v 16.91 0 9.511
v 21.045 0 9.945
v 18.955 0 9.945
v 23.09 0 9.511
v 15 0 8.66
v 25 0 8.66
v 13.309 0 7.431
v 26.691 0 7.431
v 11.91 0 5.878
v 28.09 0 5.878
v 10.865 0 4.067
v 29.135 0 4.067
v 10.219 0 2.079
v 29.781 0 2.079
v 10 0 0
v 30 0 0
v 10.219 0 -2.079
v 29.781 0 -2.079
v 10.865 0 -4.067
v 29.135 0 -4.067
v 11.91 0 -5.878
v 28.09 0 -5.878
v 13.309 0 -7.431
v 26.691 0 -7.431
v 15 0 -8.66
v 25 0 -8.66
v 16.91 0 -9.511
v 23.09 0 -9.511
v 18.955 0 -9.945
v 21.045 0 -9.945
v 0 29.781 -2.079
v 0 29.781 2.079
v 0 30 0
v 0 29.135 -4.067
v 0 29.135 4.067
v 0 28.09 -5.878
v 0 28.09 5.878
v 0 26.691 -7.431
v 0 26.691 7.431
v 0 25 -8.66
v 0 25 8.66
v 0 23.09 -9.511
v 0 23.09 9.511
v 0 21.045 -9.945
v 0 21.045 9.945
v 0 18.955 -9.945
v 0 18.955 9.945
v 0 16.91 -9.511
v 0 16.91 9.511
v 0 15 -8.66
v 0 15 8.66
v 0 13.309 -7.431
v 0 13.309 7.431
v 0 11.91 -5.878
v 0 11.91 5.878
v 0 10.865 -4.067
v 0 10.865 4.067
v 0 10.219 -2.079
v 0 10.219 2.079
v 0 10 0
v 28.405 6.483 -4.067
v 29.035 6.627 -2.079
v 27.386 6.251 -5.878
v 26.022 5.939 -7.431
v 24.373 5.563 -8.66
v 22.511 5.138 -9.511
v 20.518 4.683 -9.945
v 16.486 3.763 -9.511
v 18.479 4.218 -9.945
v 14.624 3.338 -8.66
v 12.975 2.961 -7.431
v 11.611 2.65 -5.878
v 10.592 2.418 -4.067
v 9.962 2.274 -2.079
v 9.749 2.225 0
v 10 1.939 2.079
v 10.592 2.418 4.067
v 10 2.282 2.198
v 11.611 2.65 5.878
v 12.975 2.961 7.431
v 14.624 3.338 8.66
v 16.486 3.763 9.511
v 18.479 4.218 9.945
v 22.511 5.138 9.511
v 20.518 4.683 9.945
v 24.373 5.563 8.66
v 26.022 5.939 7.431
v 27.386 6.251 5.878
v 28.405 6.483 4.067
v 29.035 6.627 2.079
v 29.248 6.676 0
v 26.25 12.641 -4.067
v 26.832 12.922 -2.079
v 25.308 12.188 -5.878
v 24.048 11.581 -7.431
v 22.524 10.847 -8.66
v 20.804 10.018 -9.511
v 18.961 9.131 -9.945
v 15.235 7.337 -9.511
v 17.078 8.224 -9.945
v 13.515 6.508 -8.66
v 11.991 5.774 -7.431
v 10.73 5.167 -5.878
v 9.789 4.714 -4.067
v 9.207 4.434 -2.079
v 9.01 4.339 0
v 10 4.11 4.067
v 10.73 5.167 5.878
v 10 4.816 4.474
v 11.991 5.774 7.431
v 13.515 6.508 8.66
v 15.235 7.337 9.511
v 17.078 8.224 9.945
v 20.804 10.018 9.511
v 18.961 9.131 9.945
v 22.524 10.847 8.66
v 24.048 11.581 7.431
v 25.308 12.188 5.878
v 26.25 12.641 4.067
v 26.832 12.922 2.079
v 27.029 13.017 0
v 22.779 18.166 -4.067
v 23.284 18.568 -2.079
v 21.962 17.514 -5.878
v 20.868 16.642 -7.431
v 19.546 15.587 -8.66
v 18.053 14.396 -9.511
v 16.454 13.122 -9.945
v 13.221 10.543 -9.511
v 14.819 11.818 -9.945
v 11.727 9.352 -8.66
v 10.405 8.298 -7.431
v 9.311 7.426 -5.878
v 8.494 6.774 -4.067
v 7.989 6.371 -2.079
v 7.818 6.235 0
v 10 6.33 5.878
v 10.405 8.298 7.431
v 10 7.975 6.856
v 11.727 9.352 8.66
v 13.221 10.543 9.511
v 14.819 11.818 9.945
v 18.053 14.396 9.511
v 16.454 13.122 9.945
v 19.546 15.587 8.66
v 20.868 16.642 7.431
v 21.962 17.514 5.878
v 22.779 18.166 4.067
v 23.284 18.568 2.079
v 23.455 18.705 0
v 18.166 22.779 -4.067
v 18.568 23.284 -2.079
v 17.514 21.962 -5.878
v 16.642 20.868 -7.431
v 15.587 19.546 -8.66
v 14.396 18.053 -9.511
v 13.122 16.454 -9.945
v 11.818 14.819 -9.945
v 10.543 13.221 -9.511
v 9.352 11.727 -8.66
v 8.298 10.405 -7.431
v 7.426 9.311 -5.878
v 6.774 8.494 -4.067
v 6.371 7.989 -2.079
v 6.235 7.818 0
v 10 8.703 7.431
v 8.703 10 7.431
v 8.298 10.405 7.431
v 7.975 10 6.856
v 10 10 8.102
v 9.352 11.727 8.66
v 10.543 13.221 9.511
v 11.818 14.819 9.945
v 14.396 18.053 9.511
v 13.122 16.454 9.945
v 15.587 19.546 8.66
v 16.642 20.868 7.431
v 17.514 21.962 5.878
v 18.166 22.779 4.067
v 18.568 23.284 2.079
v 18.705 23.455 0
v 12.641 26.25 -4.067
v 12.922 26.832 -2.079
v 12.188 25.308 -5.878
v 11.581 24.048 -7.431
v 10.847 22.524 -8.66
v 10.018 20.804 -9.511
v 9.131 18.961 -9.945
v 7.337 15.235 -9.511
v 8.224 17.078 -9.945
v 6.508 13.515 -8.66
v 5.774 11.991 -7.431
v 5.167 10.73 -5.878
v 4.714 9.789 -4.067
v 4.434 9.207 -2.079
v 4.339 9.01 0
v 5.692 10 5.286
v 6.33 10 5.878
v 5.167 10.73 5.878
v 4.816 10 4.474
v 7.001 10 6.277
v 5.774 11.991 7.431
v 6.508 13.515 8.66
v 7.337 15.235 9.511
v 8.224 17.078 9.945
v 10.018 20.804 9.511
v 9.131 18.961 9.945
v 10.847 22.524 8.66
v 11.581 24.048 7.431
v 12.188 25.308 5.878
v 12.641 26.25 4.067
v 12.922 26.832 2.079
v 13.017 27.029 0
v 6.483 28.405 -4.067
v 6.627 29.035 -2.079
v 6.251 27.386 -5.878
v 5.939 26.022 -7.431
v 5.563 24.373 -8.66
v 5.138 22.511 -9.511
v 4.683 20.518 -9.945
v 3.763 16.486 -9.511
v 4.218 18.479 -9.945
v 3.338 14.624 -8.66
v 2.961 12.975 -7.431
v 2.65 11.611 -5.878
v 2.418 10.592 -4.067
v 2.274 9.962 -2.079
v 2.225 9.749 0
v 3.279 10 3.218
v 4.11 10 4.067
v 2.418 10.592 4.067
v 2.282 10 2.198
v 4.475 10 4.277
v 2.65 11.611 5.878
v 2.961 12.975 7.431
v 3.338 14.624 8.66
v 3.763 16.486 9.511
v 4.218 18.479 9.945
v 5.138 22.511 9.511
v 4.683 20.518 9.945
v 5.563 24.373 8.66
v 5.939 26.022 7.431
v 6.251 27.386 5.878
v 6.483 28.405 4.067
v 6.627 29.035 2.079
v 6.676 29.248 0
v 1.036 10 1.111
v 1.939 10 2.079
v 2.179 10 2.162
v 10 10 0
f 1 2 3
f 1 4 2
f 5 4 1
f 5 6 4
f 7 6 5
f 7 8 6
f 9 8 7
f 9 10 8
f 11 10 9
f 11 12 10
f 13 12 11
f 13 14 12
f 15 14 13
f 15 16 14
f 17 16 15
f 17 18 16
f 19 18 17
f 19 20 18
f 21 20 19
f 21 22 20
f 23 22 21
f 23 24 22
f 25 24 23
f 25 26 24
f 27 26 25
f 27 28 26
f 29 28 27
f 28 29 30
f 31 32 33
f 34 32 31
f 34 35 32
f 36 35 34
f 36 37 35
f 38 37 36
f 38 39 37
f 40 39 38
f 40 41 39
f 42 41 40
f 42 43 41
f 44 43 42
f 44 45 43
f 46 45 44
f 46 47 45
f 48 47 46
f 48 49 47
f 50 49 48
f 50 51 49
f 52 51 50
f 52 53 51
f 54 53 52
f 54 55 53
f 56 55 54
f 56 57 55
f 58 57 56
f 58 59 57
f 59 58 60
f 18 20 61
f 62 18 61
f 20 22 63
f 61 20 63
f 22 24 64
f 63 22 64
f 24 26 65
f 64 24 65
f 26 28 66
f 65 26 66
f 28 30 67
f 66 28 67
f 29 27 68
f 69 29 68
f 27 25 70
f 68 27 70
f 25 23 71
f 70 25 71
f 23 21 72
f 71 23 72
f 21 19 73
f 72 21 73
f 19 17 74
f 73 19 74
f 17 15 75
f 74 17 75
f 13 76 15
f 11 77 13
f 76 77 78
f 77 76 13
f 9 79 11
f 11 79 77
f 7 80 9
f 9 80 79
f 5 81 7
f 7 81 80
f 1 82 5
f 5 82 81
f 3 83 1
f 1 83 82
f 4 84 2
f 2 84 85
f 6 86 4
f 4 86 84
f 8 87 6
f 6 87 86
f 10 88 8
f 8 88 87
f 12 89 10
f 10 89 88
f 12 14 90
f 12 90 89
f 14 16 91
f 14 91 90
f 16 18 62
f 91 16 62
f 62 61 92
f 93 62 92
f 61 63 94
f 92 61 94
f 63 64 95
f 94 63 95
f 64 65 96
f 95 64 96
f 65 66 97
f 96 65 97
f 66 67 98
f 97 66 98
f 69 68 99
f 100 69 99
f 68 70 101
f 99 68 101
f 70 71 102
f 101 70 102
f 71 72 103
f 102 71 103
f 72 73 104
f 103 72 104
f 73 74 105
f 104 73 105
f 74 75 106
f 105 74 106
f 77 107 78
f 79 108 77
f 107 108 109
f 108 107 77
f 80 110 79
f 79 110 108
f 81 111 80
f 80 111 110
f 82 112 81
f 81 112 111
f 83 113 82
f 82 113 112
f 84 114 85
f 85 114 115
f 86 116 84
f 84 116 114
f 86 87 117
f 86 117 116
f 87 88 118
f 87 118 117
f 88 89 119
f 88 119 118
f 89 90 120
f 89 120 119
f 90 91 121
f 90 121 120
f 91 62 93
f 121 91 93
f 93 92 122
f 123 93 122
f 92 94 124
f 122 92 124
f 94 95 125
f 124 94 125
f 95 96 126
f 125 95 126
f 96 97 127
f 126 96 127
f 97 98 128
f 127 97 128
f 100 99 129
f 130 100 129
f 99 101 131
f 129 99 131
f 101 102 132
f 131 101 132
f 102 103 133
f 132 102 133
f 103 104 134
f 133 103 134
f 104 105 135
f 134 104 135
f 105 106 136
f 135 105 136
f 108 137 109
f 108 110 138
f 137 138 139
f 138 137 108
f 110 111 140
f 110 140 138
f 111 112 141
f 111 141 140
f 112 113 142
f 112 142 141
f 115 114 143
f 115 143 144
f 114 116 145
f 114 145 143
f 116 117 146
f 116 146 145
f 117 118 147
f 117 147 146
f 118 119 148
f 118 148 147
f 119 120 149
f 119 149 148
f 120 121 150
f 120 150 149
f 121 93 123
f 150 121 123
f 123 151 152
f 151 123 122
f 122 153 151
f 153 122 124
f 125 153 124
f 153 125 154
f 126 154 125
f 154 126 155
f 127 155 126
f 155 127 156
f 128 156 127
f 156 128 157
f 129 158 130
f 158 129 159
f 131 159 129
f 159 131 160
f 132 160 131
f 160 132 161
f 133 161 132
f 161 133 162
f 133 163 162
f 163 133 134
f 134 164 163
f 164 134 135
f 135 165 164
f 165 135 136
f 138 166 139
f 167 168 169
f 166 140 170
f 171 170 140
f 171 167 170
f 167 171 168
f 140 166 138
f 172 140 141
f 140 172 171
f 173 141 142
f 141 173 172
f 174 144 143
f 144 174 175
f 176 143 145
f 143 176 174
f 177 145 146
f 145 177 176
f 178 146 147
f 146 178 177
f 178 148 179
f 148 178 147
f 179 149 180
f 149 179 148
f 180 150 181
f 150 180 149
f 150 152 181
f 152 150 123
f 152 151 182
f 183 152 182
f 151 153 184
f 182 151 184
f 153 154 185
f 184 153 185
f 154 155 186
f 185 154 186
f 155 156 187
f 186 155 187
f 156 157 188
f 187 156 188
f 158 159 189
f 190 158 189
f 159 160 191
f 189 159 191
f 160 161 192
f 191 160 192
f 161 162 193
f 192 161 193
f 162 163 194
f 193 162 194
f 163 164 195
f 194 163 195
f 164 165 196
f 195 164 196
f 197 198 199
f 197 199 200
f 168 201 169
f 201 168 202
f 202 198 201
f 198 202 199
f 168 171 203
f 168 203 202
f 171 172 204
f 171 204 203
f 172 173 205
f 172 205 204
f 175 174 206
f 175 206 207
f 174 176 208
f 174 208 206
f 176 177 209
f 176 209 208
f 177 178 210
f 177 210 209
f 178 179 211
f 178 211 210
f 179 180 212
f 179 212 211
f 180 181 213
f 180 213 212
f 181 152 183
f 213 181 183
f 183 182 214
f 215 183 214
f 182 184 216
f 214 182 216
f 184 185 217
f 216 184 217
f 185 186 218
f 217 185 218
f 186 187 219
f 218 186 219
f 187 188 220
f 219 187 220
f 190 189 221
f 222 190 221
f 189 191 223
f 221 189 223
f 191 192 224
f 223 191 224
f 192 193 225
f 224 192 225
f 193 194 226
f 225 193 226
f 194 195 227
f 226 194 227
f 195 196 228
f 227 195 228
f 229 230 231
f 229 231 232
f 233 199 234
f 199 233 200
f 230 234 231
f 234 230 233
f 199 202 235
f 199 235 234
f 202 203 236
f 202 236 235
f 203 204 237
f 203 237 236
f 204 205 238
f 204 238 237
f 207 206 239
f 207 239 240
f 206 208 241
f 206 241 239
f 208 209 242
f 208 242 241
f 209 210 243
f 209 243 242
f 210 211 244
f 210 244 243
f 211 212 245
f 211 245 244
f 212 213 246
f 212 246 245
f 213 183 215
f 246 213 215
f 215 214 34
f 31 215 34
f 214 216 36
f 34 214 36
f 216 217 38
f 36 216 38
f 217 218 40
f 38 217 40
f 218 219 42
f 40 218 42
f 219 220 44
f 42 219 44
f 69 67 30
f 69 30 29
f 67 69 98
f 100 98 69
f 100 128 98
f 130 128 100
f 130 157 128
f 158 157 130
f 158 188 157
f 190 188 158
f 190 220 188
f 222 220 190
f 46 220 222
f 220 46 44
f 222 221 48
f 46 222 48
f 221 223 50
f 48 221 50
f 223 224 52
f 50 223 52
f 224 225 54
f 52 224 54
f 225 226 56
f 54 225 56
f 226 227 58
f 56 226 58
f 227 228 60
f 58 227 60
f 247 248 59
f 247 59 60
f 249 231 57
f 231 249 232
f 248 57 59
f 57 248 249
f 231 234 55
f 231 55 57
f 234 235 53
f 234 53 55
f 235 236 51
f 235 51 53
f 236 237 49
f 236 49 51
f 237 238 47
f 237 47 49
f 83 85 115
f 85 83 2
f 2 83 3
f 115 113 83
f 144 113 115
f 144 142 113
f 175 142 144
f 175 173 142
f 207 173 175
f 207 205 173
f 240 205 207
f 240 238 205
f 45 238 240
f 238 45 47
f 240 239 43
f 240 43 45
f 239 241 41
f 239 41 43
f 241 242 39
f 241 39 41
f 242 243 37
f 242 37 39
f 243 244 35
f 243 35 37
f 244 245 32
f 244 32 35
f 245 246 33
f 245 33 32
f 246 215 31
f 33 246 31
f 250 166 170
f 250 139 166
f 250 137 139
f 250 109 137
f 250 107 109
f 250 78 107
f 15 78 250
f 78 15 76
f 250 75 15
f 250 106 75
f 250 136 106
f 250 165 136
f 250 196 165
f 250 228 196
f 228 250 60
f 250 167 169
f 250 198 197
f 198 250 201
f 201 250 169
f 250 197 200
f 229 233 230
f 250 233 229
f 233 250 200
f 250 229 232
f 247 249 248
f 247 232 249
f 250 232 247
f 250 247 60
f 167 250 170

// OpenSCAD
length = 40;

difference()  {
    rotate_extrude(angle=90, convexity=10)
   translate([20, 0]) circle(10);
    cube([10, 10, 10]);
}
